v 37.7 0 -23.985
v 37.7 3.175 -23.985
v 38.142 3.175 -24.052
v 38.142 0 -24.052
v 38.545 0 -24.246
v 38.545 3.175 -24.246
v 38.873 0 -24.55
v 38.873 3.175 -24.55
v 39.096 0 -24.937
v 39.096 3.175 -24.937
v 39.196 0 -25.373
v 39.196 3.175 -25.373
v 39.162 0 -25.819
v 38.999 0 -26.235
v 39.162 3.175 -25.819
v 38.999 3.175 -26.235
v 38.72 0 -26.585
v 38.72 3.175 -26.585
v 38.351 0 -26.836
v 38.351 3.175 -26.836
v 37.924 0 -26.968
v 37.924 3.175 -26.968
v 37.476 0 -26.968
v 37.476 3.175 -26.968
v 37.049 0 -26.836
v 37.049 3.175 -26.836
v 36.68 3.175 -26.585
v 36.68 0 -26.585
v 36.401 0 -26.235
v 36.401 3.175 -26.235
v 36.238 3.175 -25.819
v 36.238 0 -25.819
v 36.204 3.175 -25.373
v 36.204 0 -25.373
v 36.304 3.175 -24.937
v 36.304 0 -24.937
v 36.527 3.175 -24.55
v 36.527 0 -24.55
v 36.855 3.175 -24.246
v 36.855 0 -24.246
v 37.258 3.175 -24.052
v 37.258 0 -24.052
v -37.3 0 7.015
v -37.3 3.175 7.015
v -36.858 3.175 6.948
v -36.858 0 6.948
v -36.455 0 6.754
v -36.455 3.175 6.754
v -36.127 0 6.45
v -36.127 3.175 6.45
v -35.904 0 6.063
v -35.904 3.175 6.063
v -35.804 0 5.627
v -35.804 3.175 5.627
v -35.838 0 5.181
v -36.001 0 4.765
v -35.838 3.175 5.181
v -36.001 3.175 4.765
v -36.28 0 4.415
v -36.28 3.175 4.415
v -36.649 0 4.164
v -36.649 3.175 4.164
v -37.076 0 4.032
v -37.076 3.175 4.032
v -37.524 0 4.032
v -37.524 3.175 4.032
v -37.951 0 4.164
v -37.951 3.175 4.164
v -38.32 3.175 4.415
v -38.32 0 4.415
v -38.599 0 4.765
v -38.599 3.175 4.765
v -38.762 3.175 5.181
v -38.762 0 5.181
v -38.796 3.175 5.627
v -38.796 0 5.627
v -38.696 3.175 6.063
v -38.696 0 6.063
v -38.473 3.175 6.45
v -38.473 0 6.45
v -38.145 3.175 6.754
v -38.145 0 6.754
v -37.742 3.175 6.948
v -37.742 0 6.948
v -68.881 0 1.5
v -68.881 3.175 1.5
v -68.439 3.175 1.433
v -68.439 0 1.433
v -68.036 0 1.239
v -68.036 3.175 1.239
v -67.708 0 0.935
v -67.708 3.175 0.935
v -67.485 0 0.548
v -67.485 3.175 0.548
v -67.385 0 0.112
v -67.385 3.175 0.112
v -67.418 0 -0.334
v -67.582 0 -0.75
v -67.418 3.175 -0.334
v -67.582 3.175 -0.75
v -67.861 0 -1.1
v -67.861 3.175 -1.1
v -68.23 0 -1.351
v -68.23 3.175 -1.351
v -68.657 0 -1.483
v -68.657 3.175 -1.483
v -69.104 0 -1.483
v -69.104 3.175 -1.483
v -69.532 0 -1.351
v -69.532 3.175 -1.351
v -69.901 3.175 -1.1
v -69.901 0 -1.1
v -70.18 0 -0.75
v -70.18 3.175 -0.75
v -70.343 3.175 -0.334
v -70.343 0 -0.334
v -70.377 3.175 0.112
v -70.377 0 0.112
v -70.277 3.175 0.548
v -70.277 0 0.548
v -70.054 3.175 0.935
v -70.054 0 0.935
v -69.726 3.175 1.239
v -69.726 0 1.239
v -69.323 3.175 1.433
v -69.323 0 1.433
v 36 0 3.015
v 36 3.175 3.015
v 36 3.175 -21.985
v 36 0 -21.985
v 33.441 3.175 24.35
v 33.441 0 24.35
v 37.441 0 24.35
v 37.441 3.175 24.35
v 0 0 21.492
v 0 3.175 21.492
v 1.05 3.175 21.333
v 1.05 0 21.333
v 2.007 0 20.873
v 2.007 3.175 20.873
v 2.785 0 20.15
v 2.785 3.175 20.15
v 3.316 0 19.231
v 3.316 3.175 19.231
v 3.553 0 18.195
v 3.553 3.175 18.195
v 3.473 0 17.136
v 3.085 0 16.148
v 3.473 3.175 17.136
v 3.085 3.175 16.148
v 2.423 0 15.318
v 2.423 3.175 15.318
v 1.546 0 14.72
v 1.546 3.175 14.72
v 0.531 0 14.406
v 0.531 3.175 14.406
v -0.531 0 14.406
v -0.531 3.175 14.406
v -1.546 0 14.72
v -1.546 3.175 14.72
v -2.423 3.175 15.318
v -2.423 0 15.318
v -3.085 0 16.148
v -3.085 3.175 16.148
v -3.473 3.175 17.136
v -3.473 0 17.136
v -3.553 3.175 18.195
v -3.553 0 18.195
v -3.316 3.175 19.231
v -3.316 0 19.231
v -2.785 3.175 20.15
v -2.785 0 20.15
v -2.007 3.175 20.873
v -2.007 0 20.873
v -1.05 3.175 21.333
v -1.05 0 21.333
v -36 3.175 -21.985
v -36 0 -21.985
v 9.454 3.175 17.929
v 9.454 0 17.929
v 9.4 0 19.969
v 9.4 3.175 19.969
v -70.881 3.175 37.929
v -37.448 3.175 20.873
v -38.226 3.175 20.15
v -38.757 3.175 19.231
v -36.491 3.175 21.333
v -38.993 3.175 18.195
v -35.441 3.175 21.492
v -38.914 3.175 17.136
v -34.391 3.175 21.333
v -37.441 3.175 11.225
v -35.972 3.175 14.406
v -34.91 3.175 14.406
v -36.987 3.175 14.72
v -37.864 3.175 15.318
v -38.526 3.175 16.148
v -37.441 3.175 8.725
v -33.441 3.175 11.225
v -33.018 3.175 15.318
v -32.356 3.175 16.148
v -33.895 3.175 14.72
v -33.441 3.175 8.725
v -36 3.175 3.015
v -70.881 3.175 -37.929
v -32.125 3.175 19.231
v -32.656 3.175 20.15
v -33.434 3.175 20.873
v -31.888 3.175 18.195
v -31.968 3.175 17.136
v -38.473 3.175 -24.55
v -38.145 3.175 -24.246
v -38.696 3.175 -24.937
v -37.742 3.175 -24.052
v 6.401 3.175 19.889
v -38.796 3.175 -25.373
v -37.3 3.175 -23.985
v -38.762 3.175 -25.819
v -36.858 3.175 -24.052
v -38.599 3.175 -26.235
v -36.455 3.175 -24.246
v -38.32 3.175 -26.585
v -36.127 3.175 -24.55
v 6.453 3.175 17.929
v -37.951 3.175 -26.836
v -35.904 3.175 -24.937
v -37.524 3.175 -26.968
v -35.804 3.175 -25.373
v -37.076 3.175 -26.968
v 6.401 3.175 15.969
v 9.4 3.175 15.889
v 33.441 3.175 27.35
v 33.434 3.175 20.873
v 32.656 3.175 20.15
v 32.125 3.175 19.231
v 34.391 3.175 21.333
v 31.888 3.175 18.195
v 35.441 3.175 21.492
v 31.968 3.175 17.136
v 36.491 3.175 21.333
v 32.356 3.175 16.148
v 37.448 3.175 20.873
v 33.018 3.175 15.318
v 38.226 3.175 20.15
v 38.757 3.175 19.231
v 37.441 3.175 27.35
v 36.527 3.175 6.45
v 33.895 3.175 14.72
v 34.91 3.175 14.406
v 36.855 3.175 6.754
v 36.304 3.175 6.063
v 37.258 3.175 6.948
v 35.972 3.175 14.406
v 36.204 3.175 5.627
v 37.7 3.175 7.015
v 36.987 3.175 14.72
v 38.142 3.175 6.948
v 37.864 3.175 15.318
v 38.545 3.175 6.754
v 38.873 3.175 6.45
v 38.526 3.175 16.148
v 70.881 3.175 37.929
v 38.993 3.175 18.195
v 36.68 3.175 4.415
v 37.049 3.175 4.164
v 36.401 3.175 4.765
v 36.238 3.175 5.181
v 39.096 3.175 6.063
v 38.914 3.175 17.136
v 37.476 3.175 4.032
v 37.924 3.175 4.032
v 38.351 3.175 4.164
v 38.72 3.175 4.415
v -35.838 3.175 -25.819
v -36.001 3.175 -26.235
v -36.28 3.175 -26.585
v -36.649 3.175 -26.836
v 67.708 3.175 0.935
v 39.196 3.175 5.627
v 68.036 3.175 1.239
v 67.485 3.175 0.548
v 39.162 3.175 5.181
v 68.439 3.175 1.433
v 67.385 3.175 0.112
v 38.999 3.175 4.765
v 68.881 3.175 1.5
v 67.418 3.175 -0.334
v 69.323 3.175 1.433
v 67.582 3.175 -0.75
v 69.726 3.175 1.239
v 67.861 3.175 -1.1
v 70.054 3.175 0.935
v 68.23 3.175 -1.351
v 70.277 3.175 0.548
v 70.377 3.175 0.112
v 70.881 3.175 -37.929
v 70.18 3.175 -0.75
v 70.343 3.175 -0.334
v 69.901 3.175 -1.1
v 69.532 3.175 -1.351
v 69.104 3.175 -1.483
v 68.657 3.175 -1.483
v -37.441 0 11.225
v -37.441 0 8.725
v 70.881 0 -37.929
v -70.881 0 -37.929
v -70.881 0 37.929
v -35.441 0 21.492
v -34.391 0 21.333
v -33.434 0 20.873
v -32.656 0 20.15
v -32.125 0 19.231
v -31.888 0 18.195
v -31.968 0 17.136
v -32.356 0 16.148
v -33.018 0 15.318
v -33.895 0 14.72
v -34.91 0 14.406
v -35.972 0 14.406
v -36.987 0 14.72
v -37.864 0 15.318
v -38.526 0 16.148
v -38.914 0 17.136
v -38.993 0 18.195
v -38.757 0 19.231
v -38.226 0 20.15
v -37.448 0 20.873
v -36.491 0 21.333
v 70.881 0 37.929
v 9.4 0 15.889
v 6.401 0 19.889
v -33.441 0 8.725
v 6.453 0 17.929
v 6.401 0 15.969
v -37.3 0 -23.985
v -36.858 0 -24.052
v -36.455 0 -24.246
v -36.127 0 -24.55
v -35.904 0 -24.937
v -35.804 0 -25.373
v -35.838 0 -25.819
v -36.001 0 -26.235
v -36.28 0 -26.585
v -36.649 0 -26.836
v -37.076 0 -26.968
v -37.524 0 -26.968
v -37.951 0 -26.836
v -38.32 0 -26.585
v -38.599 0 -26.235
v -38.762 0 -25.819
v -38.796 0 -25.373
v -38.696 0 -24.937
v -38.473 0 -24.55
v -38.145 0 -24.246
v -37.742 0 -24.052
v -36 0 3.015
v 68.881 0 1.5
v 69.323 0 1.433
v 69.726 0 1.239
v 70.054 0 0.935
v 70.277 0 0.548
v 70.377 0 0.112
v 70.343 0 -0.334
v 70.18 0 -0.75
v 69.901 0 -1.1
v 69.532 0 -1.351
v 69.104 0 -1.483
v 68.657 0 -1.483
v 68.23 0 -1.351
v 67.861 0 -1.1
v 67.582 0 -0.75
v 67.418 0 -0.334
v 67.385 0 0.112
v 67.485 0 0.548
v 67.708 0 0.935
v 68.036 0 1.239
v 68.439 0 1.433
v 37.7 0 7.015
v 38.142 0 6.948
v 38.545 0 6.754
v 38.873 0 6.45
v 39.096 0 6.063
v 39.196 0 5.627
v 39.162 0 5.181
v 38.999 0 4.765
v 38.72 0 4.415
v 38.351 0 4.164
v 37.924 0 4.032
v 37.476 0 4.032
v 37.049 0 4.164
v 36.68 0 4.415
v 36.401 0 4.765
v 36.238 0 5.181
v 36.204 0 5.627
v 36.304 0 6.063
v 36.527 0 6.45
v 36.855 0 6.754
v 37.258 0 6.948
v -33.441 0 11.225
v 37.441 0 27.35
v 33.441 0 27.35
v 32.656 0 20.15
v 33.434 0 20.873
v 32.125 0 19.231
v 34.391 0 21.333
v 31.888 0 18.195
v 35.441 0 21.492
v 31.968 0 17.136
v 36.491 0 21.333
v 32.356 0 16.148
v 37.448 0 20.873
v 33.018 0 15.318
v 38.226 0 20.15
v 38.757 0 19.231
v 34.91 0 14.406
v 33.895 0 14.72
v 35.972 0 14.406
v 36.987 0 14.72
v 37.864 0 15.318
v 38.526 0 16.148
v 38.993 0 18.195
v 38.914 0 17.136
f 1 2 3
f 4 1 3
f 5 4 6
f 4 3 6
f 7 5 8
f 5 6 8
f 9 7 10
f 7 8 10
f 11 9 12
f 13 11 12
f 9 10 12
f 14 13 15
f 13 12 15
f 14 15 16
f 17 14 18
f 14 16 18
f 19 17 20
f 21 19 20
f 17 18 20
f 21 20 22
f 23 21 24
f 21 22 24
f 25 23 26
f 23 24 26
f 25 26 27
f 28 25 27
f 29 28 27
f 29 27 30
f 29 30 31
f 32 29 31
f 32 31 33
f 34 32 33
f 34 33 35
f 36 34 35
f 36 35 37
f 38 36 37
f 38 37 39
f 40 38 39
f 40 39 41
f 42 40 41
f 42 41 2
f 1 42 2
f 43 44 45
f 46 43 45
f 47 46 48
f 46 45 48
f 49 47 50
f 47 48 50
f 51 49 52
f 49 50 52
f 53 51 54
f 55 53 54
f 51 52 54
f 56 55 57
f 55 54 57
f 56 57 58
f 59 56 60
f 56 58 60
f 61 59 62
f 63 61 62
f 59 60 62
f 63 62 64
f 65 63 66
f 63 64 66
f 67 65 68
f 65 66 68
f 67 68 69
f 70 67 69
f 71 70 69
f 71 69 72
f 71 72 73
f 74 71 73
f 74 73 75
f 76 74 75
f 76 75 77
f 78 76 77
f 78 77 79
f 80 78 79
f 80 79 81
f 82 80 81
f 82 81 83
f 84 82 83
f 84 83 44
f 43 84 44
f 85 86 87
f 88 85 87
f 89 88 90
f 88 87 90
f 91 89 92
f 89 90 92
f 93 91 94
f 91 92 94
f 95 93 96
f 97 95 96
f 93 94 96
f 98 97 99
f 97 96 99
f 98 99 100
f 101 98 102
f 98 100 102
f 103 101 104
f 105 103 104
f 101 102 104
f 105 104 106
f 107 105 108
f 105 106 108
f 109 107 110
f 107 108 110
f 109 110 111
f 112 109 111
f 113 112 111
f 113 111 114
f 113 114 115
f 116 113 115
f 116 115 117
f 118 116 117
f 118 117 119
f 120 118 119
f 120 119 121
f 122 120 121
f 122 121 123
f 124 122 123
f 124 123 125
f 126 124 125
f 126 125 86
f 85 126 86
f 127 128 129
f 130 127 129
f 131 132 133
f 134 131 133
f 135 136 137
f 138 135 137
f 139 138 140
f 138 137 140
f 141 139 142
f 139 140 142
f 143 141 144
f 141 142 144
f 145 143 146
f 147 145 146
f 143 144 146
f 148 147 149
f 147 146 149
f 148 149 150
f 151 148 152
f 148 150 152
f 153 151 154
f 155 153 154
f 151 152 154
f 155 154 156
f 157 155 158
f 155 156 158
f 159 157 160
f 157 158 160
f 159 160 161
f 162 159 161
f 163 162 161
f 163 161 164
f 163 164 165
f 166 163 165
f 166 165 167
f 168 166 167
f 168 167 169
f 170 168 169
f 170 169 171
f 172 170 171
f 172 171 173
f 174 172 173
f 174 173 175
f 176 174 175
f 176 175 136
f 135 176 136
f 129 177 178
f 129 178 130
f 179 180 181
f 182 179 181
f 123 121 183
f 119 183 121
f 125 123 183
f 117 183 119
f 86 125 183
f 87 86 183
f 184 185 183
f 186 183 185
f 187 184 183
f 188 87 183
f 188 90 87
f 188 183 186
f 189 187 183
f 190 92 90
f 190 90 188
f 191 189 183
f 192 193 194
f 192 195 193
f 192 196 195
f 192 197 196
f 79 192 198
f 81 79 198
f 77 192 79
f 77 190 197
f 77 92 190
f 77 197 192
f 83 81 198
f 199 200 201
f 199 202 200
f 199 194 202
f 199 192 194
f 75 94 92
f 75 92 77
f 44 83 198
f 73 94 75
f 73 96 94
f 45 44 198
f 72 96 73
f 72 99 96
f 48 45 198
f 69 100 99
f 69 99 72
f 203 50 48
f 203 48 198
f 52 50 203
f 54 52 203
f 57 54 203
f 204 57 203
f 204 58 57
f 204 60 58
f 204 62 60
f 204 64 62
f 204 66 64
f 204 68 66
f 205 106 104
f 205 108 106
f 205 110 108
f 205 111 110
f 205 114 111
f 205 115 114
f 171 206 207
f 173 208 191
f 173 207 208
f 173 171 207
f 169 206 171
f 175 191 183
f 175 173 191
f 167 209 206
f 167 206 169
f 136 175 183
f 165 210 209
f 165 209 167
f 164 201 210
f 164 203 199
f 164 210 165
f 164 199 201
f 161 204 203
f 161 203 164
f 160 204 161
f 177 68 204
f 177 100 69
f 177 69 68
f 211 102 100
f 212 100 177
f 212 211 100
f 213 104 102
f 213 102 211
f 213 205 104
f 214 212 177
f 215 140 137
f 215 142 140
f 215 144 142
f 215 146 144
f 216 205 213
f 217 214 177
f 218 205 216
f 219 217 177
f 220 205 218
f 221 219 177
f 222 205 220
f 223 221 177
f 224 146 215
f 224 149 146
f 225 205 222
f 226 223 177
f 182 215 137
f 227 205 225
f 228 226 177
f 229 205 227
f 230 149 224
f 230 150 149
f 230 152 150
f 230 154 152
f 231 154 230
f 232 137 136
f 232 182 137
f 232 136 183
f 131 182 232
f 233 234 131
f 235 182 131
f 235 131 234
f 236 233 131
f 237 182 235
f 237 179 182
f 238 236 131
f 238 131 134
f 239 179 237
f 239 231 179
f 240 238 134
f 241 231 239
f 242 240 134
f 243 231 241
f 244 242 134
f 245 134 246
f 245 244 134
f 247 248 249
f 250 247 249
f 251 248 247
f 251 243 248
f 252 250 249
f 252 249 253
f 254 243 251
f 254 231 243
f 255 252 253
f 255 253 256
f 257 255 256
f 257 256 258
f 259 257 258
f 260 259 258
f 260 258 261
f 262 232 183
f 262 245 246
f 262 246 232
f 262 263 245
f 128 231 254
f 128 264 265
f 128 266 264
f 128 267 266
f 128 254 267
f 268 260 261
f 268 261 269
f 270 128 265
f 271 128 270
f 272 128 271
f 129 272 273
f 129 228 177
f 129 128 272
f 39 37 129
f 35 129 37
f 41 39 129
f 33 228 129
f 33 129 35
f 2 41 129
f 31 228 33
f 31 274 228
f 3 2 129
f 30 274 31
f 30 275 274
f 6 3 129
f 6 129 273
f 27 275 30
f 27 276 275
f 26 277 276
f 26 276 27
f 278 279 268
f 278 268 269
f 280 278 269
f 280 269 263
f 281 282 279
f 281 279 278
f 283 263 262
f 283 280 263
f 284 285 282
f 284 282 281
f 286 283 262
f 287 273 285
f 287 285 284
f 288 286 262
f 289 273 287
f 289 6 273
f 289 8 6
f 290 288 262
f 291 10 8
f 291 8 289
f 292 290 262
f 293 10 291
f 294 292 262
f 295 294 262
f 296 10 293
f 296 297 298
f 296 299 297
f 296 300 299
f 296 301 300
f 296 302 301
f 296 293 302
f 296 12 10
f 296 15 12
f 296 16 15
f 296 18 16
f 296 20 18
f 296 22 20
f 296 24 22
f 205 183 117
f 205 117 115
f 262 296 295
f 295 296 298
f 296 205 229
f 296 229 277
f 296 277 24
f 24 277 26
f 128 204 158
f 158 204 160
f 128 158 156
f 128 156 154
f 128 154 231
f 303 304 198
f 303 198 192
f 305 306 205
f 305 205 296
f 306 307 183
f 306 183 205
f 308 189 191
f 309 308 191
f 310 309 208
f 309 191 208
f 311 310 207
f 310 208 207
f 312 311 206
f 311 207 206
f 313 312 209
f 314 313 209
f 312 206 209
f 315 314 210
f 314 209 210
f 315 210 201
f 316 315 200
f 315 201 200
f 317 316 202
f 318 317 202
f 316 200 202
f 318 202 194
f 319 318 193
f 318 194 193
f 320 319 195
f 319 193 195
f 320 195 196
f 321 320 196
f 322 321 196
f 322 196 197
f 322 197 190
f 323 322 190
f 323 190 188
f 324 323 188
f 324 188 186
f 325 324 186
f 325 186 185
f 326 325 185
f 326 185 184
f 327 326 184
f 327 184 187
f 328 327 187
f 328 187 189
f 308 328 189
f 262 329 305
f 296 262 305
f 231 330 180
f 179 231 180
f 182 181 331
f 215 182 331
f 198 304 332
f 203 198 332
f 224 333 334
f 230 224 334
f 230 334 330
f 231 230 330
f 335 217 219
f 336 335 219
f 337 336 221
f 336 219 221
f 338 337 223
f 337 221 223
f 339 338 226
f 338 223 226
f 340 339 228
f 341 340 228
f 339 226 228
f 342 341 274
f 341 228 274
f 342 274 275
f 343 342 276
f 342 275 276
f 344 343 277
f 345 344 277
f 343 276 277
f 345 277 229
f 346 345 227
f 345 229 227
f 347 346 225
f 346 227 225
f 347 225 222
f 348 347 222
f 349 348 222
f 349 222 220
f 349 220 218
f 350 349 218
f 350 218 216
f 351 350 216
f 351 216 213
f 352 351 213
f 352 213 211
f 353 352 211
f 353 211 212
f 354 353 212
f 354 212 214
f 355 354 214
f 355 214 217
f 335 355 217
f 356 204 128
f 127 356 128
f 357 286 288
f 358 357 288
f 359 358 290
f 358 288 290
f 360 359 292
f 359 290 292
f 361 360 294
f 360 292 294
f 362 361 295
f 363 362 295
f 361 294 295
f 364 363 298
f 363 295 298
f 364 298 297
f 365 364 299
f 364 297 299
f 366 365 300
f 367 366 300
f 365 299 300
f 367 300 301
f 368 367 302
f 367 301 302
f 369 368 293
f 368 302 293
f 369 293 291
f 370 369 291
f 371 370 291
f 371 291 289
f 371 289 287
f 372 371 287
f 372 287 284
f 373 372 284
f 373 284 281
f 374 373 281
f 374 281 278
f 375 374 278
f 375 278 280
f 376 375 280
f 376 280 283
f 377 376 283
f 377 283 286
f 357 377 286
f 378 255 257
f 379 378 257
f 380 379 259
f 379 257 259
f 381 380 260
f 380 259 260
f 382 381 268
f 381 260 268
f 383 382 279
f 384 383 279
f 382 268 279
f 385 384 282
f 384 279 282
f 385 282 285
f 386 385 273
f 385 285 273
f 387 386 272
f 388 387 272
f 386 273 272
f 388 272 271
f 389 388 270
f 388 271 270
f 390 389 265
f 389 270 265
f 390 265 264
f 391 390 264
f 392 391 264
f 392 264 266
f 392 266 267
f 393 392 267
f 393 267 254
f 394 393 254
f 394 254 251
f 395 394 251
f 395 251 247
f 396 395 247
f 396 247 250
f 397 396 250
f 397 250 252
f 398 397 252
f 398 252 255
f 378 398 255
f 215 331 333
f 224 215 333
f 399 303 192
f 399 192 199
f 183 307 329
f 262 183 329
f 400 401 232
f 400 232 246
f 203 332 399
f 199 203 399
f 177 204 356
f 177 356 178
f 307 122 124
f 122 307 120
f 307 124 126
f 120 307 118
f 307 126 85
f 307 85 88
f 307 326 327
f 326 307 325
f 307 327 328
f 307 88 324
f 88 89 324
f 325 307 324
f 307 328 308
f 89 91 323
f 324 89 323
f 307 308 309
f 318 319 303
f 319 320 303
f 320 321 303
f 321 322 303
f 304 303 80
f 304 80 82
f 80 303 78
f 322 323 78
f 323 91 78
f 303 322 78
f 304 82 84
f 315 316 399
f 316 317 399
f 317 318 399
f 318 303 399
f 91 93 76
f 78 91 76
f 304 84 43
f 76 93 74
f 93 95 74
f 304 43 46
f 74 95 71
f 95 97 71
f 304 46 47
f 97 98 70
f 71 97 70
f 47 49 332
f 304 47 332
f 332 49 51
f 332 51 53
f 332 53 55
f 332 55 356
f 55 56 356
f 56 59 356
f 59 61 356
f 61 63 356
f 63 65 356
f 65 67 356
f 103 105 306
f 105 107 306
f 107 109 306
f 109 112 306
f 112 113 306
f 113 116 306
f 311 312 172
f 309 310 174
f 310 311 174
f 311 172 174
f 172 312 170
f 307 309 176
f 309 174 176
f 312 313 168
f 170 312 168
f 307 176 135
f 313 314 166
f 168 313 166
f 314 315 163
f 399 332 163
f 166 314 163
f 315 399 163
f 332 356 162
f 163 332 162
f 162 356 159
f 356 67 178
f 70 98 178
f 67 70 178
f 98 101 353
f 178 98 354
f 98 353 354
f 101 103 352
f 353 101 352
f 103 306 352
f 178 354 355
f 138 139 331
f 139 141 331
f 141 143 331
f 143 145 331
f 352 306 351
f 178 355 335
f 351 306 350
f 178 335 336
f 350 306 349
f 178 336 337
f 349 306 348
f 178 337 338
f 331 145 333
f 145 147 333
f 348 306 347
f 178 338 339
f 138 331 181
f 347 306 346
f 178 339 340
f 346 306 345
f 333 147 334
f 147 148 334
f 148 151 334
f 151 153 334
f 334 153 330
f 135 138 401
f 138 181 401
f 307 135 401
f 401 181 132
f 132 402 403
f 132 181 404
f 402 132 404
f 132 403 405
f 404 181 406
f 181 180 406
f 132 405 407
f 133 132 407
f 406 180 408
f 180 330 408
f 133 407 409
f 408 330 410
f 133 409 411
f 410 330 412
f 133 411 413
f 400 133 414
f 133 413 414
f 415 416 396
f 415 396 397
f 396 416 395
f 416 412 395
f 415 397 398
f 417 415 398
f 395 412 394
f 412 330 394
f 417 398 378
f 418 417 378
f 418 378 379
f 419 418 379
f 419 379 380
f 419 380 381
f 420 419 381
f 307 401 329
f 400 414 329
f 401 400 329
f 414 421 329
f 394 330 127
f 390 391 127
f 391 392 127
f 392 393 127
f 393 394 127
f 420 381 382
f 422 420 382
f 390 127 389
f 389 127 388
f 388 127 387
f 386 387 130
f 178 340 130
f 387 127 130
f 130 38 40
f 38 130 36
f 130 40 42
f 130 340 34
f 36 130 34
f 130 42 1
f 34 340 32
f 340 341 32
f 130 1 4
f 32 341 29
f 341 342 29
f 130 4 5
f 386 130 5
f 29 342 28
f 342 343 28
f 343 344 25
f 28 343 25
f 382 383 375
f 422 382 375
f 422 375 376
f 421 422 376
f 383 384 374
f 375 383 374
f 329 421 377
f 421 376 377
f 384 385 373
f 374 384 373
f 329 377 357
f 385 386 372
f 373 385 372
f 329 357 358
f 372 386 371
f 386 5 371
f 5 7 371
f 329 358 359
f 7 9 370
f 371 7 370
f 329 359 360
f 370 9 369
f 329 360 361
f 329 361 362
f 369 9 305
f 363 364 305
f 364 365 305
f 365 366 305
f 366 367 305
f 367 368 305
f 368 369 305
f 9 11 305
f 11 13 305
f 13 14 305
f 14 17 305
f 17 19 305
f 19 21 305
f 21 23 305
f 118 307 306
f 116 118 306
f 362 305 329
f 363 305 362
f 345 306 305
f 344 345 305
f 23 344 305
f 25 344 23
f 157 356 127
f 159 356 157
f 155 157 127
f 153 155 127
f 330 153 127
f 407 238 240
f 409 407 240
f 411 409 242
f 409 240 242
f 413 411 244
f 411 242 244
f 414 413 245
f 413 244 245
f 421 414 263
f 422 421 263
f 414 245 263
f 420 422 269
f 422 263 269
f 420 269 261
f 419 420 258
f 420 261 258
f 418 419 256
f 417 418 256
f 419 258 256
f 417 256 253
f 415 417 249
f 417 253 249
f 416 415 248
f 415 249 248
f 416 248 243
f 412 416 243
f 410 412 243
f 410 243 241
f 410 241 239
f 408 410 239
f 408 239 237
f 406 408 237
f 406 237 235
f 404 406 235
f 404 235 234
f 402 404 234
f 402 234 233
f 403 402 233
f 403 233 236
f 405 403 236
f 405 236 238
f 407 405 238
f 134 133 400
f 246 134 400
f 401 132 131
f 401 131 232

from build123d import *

# Parameters (mm, degrees)
SKETCH1_W           = 141.761639
SKETCH1_H           = 75.858415486
BOSS_EXTRUDE1_DEPTH = 3.175
SKETCH2_R           = 3.5625
CUT_EXTRUDE1_DEPTH  = 10
SKETCH3_W           = 72
SKETCH3_H           = 25
CUT_EXTRUDE2_DEPTH  = 10
SKETCH4_R           = 1.5
CUT_EXTRUDE3_DEPTH  = 10
SKETCH5_R           = 1.5
CUT_EXTRUDE4_DEPTH  = 10
SKETCH7_W           = 4
SKETCH7_H           = 2.5
SKETCH7_H_2         = 3
CUT_EXTRUDE5_DEPTH  = 10


with BuildPart() as part:
    # Sketch1 → Boss-Extrude1 (new body)
    with BuildSketch(Plane(origin=(0, 0, 0), x_dir=(1, 0, 0), z_dir=(0, 1, 0))):
        Rectangle(SKETCH1_W, SKETCH1_H)
    extrude(amount=BOSS_EXTRUDE1_DEPTH)

    # Sketch2 → Cut-Extrude1 (cut)
    with BuildSketch(Plane(origin=(0, 3.175, 0), x_dir=(1, 0, 0), z_dir=(0, 1, 0))):
        with Locations(Location((-35.4408195, -17.929207743, 0), (0, 0, 270))):
            Circle(SKETCH2_R)
        with Locations(Location((0, -17.929207743, 0), (0, 0, 270))):
            Circle(SKETCH2_R)
        with Locations(Location((35.4408195, -17.929207743, 0), (0, 0, 270))):
            Circle(SKETCH2_R)
    extrude(amount=-CUT_EXTRUDE1_DEPTH, mode=Mode.SUBTRACT)

    # Sketch3 → Cut-Extrude2 (cut)
    with BuildSketch(Plane(origin=(0, 3.175, 0), x_dir=(1, 0, 0), z_dir=(0, 1, 0))):
        with Locations((0, 9.485)):
            Rectangle(SKETCH3_W, SKETCH3_H)
    extrude(amount=-CUT_EXTRUDE2_DEPTH, mode=Mode.SUBTRACT)

    # Sketch4 → Cut-Extrude3 (cut)
    with BuildSketch(Plane(origin=(0, 3.175, 0), x_dir=(1, 0, 0), z_dir=(0, 1, 0))):
        with Locations(Location((37.7, 25.485, 0), (0, 0, 270))):
            Circle(SKETCH4_R)
        with Locations(Location((37.7, -5.515, 0), (0, 0, 270))):
            Circle(SKETCH4_R)
        with Locations(Location((-37.3, -5.515, 0), (0, 0, 270))):
            Circle(SKETCH4_R)
        with Locations(Location((-37.3, 25.485, 0), (0, 0, 270))):
            Circle(SKETCH4_R)
    extrude(amount=-CUT_EXTRUDE3_DEPTH, mode=Mode.SUBTRACT)

    # Sketch5 → Cut-Extrude4 (cut)
    with BuildSketch(Plane(origin=(0, 3.175, 0), x_dir=(1, 0, 0), z_dir=(0, 1, 0))):
        with Locations(Location((68.8808195, 0, 0), (0, 0, 270))):
            Circle(SKETCH5_R)
        with Locations(Location((-68.8808195, 0, 0), (0, 0, 270))):
            Circle(SKETCH5_R)
    extrude(amount=-CUT_EXTRUDE4_DEPTH, mode=Mode.SUBTRACT)

    # Sketch7 → Cut-Extrude5 (cut)
    with BuildSketch(Plane.XZ):
        with Locations((-35.4408195, 9.975414813)):
            Rectangle(SKETCH7_W, SKETCH7_H)
        Polygon((9.399912783, 19.969203639), (6.40097942, 19.889211847), (6.453259422, 17.929207743), (6.40097942, 15.969203639), (9.399912783, 15.889211847), (9.454326439, 17.929207743), align=None)
        with Locations((35.4408195, 25.849658905)):
            Rectangle(SKETCH7_W, SKETCH7_H_2)
    extrude(amount=-CUT_EXTRUDE5_DEPTH, mode=Mode.SUBTRACT)


solid = part.part
